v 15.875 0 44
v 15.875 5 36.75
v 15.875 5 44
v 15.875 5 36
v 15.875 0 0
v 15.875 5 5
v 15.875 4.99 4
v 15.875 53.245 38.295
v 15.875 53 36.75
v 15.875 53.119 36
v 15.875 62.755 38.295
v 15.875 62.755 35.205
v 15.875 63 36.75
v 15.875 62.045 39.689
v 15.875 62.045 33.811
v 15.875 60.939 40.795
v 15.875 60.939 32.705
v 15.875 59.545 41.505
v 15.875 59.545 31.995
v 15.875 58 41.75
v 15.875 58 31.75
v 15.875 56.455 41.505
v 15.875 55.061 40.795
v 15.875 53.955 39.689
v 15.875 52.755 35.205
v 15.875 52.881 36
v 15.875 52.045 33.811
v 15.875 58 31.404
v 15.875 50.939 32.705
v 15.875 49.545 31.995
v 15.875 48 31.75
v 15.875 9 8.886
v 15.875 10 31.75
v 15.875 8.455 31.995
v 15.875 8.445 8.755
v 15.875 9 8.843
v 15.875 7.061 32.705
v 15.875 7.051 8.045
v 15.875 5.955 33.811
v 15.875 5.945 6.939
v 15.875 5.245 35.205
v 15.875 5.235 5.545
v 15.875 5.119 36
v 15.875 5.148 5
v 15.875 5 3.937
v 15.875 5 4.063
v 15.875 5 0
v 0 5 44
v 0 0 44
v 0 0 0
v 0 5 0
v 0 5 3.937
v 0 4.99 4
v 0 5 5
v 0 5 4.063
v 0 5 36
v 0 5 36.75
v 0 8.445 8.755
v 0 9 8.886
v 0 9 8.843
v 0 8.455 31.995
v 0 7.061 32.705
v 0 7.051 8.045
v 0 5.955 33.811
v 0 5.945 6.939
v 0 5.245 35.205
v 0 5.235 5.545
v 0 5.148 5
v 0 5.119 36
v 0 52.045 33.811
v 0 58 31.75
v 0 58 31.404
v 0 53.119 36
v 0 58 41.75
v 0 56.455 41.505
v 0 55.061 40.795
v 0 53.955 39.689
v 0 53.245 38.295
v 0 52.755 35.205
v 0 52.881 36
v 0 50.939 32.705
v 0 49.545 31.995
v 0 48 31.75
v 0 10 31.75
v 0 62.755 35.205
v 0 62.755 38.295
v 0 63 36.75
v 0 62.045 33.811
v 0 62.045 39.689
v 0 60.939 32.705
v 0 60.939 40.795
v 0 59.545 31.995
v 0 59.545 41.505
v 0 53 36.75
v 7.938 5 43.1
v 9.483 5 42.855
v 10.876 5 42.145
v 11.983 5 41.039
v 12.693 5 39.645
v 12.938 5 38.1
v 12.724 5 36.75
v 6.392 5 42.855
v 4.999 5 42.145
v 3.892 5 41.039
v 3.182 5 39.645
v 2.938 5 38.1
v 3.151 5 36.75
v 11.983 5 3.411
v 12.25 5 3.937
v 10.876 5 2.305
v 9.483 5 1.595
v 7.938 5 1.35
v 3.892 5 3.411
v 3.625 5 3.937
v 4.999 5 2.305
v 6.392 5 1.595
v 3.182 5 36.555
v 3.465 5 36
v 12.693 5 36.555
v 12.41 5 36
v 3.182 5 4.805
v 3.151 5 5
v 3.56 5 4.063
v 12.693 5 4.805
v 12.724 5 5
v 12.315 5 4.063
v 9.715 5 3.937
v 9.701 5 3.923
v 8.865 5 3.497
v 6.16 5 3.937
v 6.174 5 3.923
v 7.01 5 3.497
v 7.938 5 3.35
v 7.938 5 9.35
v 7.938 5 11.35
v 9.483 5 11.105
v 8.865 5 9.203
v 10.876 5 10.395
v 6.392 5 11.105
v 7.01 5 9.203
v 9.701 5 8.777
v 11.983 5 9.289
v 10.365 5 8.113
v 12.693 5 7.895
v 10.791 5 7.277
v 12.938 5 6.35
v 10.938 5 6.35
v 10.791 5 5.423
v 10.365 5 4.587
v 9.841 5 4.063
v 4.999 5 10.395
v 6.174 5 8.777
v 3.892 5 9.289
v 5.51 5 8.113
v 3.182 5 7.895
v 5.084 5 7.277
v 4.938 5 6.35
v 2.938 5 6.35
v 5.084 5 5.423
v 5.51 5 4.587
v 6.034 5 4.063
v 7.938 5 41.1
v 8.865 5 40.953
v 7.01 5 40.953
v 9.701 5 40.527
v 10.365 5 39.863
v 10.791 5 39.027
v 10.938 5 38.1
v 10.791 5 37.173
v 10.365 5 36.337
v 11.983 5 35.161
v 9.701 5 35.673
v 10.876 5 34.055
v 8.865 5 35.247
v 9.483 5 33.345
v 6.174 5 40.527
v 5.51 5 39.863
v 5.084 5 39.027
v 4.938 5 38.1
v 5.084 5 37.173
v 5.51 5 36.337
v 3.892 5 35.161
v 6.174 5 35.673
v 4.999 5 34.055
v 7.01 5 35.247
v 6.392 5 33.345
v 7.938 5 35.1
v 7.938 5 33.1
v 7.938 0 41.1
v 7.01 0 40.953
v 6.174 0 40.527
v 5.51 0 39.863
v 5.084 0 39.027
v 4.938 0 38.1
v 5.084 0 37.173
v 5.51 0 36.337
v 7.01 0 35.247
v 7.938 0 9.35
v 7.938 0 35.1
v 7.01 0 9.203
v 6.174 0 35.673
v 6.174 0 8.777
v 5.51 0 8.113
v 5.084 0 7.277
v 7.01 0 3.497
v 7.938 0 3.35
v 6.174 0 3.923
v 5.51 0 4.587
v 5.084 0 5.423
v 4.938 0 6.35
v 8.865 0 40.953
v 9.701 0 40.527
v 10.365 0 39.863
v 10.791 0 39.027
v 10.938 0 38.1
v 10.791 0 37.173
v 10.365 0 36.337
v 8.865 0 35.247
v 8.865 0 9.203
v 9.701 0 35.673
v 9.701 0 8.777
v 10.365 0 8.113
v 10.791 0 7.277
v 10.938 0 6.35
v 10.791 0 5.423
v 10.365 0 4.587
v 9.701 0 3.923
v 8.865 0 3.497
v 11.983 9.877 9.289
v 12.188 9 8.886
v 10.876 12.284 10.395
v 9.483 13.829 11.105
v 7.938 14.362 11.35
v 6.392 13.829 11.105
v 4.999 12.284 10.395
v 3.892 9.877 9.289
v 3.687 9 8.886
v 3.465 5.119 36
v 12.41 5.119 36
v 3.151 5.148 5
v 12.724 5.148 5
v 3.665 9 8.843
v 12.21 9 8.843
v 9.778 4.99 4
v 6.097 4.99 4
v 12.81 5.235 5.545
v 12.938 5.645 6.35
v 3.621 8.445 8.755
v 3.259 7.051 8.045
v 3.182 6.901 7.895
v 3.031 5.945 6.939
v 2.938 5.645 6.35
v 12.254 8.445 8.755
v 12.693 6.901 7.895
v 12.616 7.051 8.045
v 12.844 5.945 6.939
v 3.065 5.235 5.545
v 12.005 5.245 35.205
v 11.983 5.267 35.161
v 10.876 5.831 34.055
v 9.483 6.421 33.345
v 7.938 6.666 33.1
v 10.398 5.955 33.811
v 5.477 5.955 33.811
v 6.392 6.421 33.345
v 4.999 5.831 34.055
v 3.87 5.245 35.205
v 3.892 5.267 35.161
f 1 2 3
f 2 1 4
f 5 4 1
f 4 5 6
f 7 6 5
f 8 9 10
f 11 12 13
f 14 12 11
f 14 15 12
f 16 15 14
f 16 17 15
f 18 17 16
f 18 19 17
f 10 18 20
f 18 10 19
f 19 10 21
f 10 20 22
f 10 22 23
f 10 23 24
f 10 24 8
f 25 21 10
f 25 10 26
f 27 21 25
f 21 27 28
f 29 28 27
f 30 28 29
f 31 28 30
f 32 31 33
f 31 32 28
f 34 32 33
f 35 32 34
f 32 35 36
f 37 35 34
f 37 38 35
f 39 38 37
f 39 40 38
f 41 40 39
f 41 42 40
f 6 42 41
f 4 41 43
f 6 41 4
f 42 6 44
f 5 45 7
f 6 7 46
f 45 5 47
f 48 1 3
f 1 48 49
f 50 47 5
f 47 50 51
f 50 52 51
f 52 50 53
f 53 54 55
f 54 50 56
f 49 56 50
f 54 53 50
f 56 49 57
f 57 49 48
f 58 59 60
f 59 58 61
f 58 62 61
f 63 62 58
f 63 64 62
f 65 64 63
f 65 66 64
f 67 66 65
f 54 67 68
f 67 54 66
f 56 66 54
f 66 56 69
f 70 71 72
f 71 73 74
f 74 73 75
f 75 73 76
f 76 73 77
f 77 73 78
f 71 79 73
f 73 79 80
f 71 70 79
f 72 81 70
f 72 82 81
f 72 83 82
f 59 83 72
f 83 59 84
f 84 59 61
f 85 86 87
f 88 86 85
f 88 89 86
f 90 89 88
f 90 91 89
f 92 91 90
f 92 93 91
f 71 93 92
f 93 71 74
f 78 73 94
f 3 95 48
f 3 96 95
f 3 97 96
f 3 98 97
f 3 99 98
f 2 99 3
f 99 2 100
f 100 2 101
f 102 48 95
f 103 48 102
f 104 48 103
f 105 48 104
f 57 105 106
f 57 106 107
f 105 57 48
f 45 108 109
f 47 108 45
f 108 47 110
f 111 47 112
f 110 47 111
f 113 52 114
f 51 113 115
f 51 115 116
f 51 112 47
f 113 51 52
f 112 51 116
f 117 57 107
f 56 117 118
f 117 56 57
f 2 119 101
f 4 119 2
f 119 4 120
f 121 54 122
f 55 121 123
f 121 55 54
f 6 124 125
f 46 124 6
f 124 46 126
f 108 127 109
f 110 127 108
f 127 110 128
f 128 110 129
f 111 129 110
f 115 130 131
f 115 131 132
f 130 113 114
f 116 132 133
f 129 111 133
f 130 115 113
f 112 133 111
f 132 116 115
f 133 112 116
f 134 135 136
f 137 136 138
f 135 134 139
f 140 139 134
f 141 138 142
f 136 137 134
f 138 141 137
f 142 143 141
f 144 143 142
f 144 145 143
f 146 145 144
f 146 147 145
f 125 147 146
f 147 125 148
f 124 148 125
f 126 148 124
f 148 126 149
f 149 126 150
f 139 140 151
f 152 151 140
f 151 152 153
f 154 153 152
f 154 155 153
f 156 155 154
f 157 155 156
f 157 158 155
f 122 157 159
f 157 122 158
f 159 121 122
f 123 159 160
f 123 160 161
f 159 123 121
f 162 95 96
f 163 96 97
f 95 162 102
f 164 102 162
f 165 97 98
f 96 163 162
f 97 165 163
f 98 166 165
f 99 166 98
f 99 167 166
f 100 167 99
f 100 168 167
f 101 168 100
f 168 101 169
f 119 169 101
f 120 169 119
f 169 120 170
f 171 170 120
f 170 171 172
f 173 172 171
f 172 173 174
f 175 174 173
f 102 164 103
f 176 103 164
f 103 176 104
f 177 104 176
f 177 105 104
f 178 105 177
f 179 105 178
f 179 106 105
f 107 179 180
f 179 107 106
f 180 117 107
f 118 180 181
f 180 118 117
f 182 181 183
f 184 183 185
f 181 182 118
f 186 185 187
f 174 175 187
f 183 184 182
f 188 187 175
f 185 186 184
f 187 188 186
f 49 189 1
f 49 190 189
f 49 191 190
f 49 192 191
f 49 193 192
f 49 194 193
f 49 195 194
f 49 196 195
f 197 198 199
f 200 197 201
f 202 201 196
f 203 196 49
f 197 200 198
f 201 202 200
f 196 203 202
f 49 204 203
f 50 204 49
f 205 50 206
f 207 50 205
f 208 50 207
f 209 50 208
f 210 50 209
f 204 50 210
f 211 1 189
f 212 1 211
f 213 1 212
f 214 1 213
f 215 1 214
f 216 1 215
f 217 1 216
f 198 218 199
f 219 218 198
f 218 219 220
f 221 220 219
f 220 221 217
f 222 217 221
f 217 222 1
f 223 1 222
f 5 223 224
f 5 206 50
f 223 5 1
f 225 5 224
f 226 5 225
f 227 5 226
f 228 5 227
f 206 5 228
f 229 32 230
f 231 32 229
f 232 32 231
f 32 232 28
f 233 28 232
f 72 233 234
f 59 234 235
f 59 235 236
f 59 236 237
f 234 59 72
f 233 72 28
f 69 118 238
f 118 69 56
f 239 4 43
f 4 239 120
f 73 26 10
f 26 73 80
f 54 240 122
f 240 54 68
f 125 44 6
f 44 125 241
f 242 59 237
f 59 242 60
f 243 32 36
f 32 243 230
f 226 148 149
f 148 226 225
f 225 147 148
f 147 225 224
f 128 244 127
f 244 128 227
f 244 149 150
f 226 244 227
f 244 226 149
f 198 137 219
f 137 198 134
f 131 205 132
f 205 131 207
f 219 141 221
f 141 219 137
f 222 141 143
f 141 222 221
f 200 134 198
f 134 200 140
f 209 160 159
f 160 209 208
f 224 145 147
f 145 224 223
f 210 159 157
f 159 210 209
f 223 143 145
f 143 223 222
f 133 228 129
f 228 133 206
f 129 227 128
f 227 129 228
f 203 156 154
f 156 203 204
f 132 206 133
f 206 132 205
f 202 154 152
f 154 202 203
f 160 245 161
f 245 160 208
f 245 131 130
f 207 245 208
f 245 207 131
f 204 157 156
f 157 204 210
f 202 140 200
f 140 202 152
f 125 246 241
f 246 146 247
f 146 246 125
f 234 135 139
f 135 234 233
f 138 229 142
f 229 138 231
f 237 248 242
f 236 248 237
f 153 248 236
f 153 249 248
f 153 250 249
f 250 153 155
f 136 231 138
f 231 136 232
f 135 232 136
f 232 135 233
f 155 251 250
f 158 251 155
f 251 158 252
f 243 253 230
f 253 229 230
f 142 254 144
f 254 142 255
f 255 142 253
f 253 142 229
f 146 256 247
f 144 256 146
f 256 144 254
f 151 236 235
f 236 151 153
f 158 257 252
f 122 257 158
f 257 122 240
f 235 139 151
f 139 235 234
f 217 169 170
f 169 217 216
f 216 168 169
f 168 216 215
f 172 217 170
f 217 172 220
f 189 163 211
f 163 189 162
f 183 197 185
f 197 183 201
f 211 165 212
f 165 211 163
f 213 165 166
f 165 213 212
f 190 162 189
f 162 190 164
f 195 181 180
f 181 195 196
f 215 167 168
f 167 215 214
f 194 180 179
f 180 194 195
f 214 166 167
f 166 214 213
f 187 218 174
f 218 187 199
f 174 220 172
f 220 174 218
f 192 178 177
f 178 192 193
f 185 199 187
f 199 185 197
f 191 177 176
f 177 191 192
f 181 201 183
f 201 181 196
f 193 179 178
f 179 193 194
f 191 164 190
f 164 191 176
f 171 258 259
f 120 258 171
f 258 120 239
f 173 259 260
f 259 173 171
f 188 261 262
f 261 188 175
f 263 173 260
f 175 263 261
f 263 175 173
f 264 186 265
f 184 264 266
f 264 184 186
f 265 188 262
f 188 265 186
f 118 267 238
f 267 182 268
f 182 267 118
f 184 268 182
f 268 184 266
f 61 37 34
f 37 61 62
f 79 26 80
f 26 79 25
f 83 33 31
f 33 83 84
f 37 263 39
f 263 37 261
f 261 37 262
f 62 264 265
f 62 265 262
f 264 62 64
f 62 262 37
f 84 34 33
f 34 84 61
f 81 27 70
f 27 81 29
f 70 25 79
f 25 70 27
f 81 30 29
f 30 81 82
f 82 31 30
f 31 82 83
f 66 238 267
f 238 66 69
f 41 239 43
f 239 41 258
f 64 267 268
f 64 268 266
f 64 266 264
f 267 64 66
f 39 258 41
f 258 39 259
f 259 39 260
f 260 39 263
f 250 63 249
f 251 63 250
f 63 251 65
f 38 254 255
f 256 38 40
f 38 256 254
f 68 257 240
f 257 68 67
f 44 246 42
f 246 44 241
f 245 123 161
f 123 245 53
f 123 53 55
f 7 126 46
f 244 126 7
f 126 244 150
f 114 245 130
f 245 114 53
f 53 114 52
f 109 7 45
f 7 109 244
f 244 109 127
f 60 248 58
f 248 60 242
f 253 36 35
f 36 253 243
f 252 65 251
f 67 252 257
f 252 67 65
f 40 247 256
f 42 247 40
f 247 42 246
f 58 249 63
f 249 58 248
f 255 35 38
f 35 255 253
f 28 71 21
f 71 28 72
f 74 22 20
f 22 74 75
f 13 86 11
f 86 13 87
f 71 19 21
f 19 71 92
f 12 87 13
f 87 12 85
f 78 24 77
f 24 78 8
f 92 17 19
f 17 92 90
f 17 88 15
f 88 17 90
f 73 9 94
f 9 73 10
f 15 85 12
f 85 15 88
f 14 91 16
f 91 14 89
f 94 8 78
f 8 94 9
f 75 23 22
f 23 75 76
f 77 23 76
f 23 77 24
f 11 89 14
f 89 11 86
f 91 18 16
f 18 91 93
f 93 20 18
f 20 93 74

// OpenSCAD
//! OpenSCAD

// originally made with blockscad3d very quickly, which is why the structure is so odd
// see project: https://www.blockscad3d.com/community/projects/1244617
// I printed their STL successfully, but decided to come back and refactor this to be customizable

// valid between 30 and 80 mm
headband_width = 48;
// TODO tilt_angle = 0;

module _stop_customizer() { }

epsilon = 0.01;
$fn = 20;

module SAS_Triangle_3D(s1, s2, a, h, valid) {
    if (valid) {
        linear_extrude(height = h, twist = 0, center = false) polygon(
            points = [ [ 0, 0 ], [ s1, 0 ], [ s2 * cos(a), s2 * sin(a) ] ]);
    } else {
        cylinder(r = 0.5, $fn = 12, height = h);
        translate([ s1, 0, 0 ]) cylinder(r = 0.5, $fn = 12, height = h);
        hull() {
            cylinder(r = 0.25, $fn = 12, height = h);
            translate([ s1, 0, 0 ]) cylinder(r = 0.25, $fn = 12, height = h);
        }
        rotate([ 0, 0, a ]) {
            translate([ s2, 0, 0 ]) cylinder(r = 0.5, $fn = 12, height = h);
            hull() {
                cylinder(r = 0.25, $fn = 12, height = h);
                translate([ s2, 0, 0 ])
                    cylinder(r = 0.25, $fn = 12, height = h);
            }
        }
        linear_extrude(height = h, twist = 0, center = false)
            invalid_triangle_arc(min(s1, s2) / 4, 0.5, a);
    }
}

module basic_shape() {
    k = 2;
    color([ 1, 0.8, 0 ]) {
        difference() {
            union() {
                cube([ 15.875, 5, 44 ], center = false);
                translate([ 0, 0, 36 ]) {
                    rotate([ 0, 90, 0 ]) {
                        SAS_Triangle_3D(29.25+k, headband_width+20, 90, 15.875, true);
                    }
                }

                // extra material for the lower fillet
                translate([0, 4, 5]) {
                    cube([15.875, 5, 10], center = false);
                }
            }

            union() {
                translate([ (15.875 / 2), 0, 6.35 ]) {
                    screw_clearance();
                }
                translate([ (15.875 / 2), 0, (6.35 + 31.75) ]) {
                    screw_clearance();
                }
                shelf_cutout();
            }
        }
    }
}

module rounded_shelf_tip() {
    color([ 1, 0.8, 0 ]) {
        translate([ 0, (headband_width + 10), (5 + 31.75) ]) {
            rotate([ 0, 90, 0 ]) {
                cylinder(r1 = 5, r2 = 5, h = 15.875, center = false);
            }
        }
    }
}

module screw_clearance() {
    rotate([ 270, 0, 0 ]) {
        union() {
            cylinder(r1 = 3, r2 = 3, h = 10, center = false);
            translate([ 0, 0, 5 ]) {
                cylinder(r1 = 5, r2 = 5, h = 10, center = false);
            }
        }
    }
}

module shelf_cutout() {
    hull() {
        // round where the upper side of the hook connects to the frame
        translate([ 0-epsilon, 10, (5 + 31.75) ]) {
            rotate([ 0, 90, 0 ]) {
                cylinder(r1 = 5, r2 = 5, h = 15.875+2*epsilon, center = false);
            }
        }
        
        // the far inside edge of the hook
        translate([ 0-epsilon, headband_width, (5 + 31.75) ]) {
            rotate([ 0, 90, 0 ]) {
                cylinder(r1 = 5, r2 = 5, h = 15.875+2*epsilon, center = false);
            }
        }
    }
    
    // round where the lower side of the hook connects to the frame
    translate([ 0-epsilon, 10-epsilon, 4 ]) {
        rotate([ 0, 90, 0 ]) {
            cylinder(r1 = 5, r2 = 5, h = 15.875+2*epsilon, center = false);
        }
    }
}

module hook() {
  union() {
      difference() {
          basic_shape();

          // trim the tip off the triangle
          color([ 0.93, 0, 0 ]) {
              translate([ 0-epsilon, headband_width+10, 30 ]) {
                  cube([ 15.875+2*epsilon, 20, 10 ], center = false);
              }
          }
      }
      rounded_shelf_tip();
  }
}

hook();
